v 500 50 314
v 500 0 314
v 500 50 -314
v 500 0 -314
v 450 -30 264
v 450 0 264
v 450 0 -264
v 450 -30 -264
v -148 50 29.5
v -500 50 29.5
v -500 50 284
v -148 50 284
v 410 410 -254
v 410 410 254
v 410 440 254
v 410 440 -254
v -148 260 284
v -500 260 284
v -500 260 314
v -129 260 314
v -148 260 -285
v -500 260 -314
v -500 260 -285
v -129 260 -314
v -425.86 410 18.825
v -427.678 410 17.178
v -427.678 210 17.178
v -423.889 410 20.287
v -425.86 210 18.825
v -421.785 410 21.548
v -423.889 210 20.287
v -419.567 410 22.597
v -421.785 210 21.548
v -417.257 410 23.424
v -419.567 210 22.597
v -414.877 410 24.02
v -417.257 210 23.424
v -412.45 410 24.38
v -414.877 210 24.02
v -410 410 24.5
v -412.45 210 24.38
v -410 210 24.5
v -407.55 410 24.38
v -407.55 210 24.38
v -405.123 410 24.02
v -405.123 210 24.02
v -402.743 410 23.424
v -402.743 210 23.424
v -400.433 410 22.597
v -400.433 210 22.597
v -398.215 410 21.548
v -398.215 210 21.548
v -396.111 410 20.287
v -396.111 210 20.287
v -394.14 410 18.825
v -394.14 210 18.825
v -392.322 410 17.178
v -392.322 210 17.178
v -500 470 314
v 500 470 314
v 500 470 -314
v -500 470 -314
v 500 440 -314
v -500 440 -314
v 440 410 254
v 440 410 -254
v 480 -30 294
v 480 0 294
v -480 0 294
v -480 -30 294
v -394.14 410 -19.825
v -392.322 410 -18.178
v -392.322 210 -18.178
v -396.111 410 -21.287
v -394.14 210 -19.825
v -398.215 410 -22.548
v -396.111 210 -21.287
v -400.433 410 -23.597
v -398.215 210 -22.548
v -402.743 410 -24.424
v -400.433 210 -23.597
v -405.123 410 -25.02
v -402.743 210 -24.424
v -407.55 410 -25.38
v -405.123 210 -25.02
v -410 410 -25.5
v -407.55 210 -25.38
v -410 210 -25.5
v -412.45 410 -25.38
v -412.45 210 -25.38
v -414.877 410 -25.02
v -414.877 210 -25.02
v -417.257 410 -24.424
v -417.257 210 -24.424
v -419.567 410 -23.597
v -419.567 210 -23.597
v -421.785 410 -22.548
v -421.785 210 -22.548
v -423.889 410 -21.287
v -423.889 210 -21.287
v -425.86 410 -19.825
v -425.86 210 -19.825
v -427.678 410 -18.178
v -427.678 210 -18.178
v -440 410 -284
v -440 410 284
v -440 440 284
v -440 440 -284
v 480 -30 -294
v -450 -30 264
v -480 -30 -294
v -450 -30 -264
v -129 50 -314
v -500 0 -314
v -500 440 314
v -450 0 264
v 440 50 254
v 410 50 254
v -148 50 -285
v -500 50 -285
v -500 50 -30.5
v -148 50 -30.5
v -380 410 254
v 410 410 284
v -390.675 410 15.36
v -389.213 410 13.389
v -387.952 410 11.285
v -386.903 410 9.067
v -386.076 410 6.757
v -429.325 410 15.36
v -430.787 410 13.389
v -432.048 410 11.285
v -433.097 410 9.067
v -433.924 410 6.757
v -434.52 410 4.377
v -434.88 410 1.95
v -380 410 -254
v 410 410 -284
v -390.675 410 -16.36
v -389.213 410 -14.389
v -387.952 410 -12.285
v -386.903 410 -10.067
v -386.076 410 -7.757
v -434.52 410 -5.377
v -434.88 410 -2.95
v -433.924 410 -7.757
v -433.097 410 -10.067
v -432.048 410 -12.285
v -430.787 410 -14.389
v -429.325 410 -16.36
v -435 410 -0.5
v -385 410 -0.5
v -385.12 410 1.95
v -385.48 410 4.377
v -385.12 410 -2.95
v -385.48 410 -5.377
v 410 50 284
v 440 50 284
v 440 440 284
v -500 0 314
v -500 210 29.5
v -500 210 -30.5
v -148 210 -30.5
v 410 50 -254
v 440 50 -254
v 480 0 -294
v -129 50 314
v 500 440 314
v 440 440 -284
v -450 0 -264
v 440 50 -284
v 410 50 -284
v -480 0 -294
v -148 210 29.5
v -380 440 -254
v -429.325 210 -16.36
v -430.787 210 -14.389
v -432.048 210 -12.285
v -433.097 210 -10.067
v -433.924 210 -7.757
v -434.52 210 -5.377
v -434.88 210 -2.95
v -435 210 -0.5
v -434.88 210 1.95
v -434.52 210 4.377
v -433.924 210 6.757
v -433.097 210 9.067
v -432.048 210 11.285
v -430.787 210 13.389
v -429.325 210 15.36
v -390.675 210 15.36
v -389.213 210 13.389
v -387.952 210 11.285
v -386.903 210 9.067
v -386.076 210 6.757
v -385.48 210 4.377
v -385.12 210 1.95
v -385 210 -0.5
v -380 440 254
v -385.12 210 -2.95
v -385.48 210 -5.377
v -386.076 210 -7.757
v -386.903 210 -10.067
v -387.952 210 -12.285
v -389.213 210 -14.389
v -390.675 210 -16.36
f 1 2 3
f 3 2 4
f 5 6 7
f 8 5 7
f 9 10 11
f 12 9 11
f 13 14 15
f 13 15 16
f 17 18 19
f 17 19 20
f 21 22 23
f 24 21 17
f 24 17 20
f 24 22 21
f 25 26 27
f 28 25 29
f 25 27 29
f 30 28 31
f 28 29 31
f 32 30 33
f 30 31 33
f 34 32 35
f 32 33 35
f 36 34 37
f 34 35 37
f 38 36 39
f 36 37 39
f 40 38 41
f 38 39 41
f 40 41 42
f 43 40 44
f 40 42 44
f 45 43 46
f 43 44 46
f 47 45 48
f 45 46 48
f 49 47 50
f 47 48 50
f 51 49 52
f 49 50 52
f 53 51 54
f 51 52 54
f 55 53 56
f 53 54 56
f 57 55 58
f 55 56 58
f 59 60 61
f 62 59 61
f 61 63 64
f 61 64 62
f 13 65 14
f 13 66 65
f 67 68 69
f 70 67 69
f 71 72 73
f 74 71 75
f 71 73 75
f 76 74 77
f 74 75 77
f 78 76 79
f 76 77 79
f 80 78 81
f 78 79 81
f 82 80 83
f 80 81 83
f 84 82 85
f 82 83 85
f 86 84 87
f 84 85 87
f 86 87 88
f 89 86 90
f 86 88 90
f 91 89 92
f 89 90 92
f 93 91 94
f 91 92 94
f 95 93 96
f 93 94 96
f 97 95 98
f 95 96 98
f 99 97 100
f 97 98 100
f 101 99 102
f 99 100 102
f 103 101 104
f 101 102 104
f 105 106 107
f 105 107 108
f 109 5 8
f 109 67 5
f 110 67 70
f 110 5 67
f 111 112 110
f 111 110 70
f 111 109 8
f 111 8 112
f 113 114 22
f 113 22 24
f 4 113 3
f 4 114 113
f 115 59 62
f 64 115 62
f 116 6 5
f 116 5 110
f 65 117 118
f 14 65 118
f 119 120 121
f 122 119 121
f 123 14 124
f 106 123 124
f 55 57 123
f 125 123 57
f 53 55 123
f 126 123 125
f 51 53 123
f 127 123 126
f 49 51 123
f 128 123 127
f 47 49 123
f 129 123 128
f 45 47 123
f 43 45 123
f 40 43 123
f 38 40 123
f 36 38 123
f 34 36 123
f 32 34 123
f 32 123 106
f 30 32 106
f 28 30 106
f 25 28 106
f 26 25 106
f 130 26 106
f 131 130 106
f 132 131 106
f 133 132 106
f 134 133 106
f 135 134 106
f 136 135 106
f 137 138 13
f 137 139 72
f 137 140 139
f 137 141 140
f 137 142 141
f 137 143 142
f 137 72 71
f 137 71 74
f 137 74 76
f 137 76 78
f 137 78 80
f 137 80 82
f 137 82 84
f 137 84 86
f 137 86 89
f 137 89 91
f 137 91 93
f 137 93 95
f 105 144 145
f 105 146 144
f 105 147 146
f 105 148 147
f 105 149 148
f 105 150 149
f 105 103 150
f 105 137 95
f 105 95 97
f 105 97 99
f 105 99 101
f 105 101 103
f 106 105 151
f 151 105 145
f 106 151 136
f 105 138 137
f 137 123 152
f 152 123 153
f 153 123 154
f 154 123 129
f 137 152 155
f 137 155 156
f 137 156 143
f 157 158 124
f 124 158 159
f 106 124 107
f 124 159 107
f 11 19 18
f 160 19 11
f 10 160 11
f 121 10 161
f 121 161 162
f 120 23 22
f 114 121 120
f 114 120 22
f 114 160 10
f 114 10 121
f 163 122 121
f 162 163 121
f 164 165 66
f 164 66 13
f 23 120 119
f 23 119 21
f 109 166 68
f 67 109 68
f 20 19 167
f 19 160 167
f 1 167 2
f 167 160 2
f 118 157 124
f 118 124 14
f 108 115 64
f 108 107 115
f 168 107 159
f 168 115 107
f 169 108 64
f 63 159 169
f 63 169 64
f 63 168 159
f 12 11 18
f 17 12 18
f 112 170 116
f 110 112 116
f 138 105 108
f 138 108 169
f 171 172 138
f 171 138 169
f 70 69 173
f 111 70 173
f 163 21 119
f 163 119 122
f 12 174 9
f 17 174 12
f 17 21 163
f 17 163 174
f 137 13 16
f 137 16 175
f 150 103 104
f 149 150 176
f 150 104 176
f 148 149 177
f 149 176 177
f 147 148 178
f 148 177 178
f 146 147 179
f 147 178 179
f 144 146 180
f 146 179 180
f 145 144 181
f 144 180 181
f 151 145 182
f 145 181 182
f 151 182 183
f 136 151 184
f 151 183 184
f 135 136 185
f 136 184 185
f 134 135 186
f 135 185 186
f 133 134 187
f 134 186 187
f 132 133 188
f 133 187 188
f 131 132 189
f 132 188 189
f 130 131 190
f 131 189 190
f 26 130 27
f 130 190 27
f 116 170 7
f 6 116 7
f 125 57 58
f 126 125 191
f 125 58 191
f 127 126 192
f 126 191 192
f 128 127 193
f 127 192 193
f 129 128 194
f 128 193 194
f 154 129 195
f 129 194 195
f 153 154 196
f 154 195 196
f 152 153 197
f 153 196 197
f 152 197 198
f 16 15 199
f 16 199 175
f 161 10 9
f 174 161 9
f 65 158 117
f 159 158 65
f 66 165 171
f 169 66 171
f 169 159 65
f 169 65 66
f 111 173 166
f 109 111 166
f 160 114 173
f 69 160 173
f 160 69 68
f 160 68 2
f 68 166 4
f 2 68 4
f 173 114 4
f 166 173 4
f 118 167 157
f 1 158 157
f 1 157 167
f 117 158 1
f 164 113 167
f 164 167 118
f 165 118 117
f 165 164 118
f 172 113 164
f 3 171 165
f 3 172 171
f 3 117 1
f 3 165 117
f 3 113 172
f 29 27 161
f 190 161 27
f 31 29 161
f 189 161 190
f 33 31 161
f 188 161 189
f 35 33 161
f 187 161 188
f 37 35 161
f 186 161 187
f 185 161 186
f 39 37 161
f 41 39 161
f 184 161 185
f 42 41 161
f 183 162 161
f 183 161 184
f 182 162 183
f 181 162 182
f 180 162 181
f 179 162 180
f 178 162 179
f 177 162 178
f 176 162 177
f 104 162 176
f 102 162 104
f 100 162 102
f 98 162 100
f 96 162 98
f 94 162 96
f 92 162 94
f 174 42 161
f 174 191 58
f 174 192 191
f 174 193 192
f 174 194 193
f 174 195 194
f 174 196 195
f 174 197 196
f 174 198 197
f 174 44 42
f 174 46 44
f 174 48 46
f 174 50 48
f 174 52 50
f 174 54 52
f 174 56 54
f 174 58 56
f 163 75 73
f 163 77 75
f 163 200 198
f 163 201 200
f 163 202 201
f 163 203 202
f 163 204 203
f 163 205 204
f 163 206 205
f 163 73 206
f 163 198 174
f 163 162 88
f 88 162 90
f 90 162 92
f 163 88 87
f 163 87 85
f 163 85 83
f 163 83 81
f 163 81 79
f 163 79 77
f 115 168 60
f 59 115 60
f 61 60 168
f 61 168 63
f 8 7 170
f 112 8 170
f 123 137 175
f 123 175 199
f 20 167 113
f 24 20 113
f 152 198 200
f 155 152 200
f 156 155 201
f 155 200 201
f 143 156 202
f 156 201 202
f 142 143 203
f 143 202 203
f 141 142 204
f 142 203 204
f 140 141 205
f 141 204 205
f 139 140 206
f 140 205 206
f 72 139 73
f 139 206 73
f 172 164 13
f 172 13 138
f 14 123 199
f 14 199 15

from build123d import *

# Parameters (mm, degrees)
SKETCH1_W           = 1000
SKETCH1_H           = 628
BOSS_EXTRUDE1_DEPTH = 50
SKETCH2_W           = 371
SKETCH2_H           = 628
BOSS_EXTRUDE2_DEPTH = 210
SKETCH3_W           = 569
SKETCH3_H           = 210
CUT_EXTRUDE1_DEPTH  = 352
BOSS_EXTRUDE3_DEPTH = 160
SKETCH6_W           = 628
SKETCH6_H           = 30
BOSS_EXTRUDE4_DEPTH = 1000
BOSS_EXTRUDE5_DEPTH = 242
BOSS_EXTRUDE6_START = 30
SKETCH8_W           = 790
SKETCH8_H           = 30
SKETCH8_R           = 25
BOSS_EXTRUDE6_DEPTH = 30
SKETCH9_W           = 30
SKETCH9_H           = 30
BOSS_EXTRUDE7_DEPTH = 388
SKETCH10_W          = 900
SKETCH10_H          = 30
BOSS_EXTRUDE8_DEPTH = 30


with BuildPart() as part:
    # Sketch1 → Boss-Extrude1 (new body)
    with BuildSketch(Plane(origin=(0, 0, 0), x_dir=(1, 0, 0), z_dir=(0, 1, 0))):
        Rectangle(SKETCH1_W, SKETCH1_H)
    extrude(amount=BOSS_EXTRUDE1_DEPTH)

    # Sketch2 → Boss-Extrude2 (add)
    with BuildSketch(Plane(origin=(0, 50, 0), x_dir=(1, 0, 0), z_dir=(0, 1, 0))):
        with Locations((-314.5, 0)):
            Rectangle(SKETCH2_W, SKETCH2_H)
    extrude(amount=BOSS_EXTRUDE2_DEPTH)

    # Sketch3 → Cut-Extrude1 (cut)
    with BuildSketch(Plane.ZY.offset(500)):
        with Locations((-0.5, 155)):
            Rectangle(SKETCH3_W, SKETCH3_H)
    extrude(amount=-CUT_EXTRUDE1_DEPTH, mode=Mode.SUBTRACT)

    # Sketch4 → Boss-Extrude3 (add)
    with BuildSketch(Plane(origin=(0, 50, 0), x_dir=(1, 0, 0), z_dir=(0, 1, 0))):
        Polygon((-342.55887522, -29.5), (-324, 0.5), (-342.55887522, 30.5), (-500, 30.5), (-500, -29.5), align=None)
        Polygon((-148, 30.5), (-305.44112478, 30.5), (-324, 0.5), (-305.44112478, -29.5), (-148, -29.5), align=None)
        Polygon((-305.44112478, -29.5), (-324, 0.5), (-324, -29.5), align=None)
        Polygon((-324, -29.5), (-324, 0.5), (-342.55887522, -29.5), align=None)
        Polygon((-324, 0.5), (-305.44112478, 30.5), (-324, 30.5), align=None)
        Polygon((-342.55887522, 30.5), (-324, 0.5), (-324, 30.5), align=None)
    extrude(amount=BOSS_EXTRUDE3_DEPTH)



with BuildPart() as body_2:
    # Sketch6 → Boss-Extrude4 (new body)
    with BuildSketch(Plane(origin=(500, 0, 0), x_dir=(0, 0, -1), z_dir=(1, 0, 0))):
        with Locations((0, 455)):
            Rectangle(SKETCH6_W, SKETCH6_H)
    extrude(amount=-BOSS_EXTRUDE4_DEPTH)


with BuildPart() as part_1:
    add(part.part)

    add(body_2.part)  # Boss-Extrude5 merges body 2
    # Sketch7 → Boss-Extrude5 (add)
    with BuildSketch(Plane(origin=(0, 210, 0), x_dir=(1, 0, 0), z_dir=(0, 1, 0))):
        with BuildLine():
            ThreePointArc((-392.32233047, 18.17766953), (-410, 25.5), (-427.67766953, 18.17766953))
            Line((-427.67766953, 18.17766953), (-410, 0.5))
            Line((-410, 0.5), (-392.32233047, 18.17766953))
        make_face()
        with BuildLine():
            Line((-410, 0.5), (-427.67766953, 18.17766953))
            ThreePointArc((-427.67766953, 18.17766953), (-435, 0.5), (-427.67766953, -17.17766953))
            Line((-427.67766953, -17.17766953), (-410, 0.5))
        make_face()
        with BuildLine():
            Line((-410, 0.5), (-427.67766953, -17.17766953))
            ThreePointArc((-427.67766953, -17.17766953), (-410, -24.5), (-392.32233047, -17.17766953))
            Line((-392.32233047, -17.17766953), (-410, 0.5))
        make_face()
        with BuildLine():
            ThreePointArc((-385, 0.5), (-386.903011687, 10.067085809), (-392.32233047, 18.17766953))
            Line((-392.32233047, 18.17766953), (-410, 0.5))
            Line((-410, 0.5), (-392.32233047, -17.17766953))
            ThreePointArc((-392.32233047, -17.17766953), (-386.903011687, -9.067085809), (-385, 0.5))
        make_face()
    extrude(amount=BOSS_EXTRUDE5_DEPTH)

    # Sketch8 → Boss-Extrude6 (add)
    # profile 1 of 4: a face of its own
    with BuildSketch(Plane(origin=(0, 440, 0), x_dir=(-1, 0, 0), z_dir=(0, -1, 0)).offset(BOSS_EXTRUDE6_START)):
        Polygon((-440, -284), (-410, -284), (-410, -254), (-410, 254), (-410, 284), (-440, 284), align=None)
    # profile 2 of 4: a face of its own
    with BuildSketch(Plane(origin=(0, 440, 0), x_dir=(-1, 0, 0), z_dir=(0, -1, 0)).offset(BOSS_EXTRUDE6_START)):
        Polygon((-410, -284), (440, -284), (440, -254), (380, -254), (-410, -254), align=None)
    # profile 3 of 4: a face of its own
    with BuildSketch(Plane(origin=(0, 440, 0), x_dir=(-1, 0, 0), z_dir=(0, -1, 0)).offset(BOSS_EXTRUDE6_START)):
        with Locations((-15, 269)):
            Rectangle(SKETCH8_W, SKETCH8_H)
    # profile 4 of 4: a face of its own
    with BuildSketch(Plane(origin=(0, 440, 0), x_dir=(-1, 0, 0), z_dir=(0, -1, 0)).offset(BOSS_EXTRUDE6_START)):
        Polygon((380, -254), (440, -254), (440, 284), (380, 284), (380, 254), align=None)
        with Locations(Location((410, 0.5, 0), (0, 0, 90))):
            Circle(SKETCH8_R, mode=Mode.SUBTRACT)
    extrude(amount=-BOSS_EXTRUDE6_DEPTH)

    # Sketch9 → Boss-Extrude7 (add)
    with BuildSketch(Plane(origin=(0, 410, 0), x_dir=(-1, 0, 0), z_dir=(0, -1, 0))):
        with Locations((-425, -269)):
            Rectangle(SKETCH9_W, SKETCH9_H)
        with Locations((-425, 269)):
            Rectangle(SKETCH9_W, SKETCH9_H)
    extrude(amount=BOSS_EXTRUDE7_DEPTH)

    # Sketch10 → Boss-Extrude8 (add)
    with BuildSketch(Plane(origin=(0, 0, 0), x_dir=(-1, 0, 0), z_dir=(0, -1, 0))):
        Polygon((480, -294), (480, 264), (450, 264), (450, -264), (450, -294), align=None)
        Polygon((480, 264), (480, 294), (-480, 294), (-480, 264), (-450, 264), (450, 264), align=None)
        with Locations((0, -279)):
            Rectangle(SKETCH10_W, SKETCH10_H)
        Polygon((-450, 264), (-480, 264), (-480, -294), (-450, -294), (-450, -264), align=None)
    extrude(amount=BOSS_EXTRUDE8_DEPTH)


solid = part_1.part
